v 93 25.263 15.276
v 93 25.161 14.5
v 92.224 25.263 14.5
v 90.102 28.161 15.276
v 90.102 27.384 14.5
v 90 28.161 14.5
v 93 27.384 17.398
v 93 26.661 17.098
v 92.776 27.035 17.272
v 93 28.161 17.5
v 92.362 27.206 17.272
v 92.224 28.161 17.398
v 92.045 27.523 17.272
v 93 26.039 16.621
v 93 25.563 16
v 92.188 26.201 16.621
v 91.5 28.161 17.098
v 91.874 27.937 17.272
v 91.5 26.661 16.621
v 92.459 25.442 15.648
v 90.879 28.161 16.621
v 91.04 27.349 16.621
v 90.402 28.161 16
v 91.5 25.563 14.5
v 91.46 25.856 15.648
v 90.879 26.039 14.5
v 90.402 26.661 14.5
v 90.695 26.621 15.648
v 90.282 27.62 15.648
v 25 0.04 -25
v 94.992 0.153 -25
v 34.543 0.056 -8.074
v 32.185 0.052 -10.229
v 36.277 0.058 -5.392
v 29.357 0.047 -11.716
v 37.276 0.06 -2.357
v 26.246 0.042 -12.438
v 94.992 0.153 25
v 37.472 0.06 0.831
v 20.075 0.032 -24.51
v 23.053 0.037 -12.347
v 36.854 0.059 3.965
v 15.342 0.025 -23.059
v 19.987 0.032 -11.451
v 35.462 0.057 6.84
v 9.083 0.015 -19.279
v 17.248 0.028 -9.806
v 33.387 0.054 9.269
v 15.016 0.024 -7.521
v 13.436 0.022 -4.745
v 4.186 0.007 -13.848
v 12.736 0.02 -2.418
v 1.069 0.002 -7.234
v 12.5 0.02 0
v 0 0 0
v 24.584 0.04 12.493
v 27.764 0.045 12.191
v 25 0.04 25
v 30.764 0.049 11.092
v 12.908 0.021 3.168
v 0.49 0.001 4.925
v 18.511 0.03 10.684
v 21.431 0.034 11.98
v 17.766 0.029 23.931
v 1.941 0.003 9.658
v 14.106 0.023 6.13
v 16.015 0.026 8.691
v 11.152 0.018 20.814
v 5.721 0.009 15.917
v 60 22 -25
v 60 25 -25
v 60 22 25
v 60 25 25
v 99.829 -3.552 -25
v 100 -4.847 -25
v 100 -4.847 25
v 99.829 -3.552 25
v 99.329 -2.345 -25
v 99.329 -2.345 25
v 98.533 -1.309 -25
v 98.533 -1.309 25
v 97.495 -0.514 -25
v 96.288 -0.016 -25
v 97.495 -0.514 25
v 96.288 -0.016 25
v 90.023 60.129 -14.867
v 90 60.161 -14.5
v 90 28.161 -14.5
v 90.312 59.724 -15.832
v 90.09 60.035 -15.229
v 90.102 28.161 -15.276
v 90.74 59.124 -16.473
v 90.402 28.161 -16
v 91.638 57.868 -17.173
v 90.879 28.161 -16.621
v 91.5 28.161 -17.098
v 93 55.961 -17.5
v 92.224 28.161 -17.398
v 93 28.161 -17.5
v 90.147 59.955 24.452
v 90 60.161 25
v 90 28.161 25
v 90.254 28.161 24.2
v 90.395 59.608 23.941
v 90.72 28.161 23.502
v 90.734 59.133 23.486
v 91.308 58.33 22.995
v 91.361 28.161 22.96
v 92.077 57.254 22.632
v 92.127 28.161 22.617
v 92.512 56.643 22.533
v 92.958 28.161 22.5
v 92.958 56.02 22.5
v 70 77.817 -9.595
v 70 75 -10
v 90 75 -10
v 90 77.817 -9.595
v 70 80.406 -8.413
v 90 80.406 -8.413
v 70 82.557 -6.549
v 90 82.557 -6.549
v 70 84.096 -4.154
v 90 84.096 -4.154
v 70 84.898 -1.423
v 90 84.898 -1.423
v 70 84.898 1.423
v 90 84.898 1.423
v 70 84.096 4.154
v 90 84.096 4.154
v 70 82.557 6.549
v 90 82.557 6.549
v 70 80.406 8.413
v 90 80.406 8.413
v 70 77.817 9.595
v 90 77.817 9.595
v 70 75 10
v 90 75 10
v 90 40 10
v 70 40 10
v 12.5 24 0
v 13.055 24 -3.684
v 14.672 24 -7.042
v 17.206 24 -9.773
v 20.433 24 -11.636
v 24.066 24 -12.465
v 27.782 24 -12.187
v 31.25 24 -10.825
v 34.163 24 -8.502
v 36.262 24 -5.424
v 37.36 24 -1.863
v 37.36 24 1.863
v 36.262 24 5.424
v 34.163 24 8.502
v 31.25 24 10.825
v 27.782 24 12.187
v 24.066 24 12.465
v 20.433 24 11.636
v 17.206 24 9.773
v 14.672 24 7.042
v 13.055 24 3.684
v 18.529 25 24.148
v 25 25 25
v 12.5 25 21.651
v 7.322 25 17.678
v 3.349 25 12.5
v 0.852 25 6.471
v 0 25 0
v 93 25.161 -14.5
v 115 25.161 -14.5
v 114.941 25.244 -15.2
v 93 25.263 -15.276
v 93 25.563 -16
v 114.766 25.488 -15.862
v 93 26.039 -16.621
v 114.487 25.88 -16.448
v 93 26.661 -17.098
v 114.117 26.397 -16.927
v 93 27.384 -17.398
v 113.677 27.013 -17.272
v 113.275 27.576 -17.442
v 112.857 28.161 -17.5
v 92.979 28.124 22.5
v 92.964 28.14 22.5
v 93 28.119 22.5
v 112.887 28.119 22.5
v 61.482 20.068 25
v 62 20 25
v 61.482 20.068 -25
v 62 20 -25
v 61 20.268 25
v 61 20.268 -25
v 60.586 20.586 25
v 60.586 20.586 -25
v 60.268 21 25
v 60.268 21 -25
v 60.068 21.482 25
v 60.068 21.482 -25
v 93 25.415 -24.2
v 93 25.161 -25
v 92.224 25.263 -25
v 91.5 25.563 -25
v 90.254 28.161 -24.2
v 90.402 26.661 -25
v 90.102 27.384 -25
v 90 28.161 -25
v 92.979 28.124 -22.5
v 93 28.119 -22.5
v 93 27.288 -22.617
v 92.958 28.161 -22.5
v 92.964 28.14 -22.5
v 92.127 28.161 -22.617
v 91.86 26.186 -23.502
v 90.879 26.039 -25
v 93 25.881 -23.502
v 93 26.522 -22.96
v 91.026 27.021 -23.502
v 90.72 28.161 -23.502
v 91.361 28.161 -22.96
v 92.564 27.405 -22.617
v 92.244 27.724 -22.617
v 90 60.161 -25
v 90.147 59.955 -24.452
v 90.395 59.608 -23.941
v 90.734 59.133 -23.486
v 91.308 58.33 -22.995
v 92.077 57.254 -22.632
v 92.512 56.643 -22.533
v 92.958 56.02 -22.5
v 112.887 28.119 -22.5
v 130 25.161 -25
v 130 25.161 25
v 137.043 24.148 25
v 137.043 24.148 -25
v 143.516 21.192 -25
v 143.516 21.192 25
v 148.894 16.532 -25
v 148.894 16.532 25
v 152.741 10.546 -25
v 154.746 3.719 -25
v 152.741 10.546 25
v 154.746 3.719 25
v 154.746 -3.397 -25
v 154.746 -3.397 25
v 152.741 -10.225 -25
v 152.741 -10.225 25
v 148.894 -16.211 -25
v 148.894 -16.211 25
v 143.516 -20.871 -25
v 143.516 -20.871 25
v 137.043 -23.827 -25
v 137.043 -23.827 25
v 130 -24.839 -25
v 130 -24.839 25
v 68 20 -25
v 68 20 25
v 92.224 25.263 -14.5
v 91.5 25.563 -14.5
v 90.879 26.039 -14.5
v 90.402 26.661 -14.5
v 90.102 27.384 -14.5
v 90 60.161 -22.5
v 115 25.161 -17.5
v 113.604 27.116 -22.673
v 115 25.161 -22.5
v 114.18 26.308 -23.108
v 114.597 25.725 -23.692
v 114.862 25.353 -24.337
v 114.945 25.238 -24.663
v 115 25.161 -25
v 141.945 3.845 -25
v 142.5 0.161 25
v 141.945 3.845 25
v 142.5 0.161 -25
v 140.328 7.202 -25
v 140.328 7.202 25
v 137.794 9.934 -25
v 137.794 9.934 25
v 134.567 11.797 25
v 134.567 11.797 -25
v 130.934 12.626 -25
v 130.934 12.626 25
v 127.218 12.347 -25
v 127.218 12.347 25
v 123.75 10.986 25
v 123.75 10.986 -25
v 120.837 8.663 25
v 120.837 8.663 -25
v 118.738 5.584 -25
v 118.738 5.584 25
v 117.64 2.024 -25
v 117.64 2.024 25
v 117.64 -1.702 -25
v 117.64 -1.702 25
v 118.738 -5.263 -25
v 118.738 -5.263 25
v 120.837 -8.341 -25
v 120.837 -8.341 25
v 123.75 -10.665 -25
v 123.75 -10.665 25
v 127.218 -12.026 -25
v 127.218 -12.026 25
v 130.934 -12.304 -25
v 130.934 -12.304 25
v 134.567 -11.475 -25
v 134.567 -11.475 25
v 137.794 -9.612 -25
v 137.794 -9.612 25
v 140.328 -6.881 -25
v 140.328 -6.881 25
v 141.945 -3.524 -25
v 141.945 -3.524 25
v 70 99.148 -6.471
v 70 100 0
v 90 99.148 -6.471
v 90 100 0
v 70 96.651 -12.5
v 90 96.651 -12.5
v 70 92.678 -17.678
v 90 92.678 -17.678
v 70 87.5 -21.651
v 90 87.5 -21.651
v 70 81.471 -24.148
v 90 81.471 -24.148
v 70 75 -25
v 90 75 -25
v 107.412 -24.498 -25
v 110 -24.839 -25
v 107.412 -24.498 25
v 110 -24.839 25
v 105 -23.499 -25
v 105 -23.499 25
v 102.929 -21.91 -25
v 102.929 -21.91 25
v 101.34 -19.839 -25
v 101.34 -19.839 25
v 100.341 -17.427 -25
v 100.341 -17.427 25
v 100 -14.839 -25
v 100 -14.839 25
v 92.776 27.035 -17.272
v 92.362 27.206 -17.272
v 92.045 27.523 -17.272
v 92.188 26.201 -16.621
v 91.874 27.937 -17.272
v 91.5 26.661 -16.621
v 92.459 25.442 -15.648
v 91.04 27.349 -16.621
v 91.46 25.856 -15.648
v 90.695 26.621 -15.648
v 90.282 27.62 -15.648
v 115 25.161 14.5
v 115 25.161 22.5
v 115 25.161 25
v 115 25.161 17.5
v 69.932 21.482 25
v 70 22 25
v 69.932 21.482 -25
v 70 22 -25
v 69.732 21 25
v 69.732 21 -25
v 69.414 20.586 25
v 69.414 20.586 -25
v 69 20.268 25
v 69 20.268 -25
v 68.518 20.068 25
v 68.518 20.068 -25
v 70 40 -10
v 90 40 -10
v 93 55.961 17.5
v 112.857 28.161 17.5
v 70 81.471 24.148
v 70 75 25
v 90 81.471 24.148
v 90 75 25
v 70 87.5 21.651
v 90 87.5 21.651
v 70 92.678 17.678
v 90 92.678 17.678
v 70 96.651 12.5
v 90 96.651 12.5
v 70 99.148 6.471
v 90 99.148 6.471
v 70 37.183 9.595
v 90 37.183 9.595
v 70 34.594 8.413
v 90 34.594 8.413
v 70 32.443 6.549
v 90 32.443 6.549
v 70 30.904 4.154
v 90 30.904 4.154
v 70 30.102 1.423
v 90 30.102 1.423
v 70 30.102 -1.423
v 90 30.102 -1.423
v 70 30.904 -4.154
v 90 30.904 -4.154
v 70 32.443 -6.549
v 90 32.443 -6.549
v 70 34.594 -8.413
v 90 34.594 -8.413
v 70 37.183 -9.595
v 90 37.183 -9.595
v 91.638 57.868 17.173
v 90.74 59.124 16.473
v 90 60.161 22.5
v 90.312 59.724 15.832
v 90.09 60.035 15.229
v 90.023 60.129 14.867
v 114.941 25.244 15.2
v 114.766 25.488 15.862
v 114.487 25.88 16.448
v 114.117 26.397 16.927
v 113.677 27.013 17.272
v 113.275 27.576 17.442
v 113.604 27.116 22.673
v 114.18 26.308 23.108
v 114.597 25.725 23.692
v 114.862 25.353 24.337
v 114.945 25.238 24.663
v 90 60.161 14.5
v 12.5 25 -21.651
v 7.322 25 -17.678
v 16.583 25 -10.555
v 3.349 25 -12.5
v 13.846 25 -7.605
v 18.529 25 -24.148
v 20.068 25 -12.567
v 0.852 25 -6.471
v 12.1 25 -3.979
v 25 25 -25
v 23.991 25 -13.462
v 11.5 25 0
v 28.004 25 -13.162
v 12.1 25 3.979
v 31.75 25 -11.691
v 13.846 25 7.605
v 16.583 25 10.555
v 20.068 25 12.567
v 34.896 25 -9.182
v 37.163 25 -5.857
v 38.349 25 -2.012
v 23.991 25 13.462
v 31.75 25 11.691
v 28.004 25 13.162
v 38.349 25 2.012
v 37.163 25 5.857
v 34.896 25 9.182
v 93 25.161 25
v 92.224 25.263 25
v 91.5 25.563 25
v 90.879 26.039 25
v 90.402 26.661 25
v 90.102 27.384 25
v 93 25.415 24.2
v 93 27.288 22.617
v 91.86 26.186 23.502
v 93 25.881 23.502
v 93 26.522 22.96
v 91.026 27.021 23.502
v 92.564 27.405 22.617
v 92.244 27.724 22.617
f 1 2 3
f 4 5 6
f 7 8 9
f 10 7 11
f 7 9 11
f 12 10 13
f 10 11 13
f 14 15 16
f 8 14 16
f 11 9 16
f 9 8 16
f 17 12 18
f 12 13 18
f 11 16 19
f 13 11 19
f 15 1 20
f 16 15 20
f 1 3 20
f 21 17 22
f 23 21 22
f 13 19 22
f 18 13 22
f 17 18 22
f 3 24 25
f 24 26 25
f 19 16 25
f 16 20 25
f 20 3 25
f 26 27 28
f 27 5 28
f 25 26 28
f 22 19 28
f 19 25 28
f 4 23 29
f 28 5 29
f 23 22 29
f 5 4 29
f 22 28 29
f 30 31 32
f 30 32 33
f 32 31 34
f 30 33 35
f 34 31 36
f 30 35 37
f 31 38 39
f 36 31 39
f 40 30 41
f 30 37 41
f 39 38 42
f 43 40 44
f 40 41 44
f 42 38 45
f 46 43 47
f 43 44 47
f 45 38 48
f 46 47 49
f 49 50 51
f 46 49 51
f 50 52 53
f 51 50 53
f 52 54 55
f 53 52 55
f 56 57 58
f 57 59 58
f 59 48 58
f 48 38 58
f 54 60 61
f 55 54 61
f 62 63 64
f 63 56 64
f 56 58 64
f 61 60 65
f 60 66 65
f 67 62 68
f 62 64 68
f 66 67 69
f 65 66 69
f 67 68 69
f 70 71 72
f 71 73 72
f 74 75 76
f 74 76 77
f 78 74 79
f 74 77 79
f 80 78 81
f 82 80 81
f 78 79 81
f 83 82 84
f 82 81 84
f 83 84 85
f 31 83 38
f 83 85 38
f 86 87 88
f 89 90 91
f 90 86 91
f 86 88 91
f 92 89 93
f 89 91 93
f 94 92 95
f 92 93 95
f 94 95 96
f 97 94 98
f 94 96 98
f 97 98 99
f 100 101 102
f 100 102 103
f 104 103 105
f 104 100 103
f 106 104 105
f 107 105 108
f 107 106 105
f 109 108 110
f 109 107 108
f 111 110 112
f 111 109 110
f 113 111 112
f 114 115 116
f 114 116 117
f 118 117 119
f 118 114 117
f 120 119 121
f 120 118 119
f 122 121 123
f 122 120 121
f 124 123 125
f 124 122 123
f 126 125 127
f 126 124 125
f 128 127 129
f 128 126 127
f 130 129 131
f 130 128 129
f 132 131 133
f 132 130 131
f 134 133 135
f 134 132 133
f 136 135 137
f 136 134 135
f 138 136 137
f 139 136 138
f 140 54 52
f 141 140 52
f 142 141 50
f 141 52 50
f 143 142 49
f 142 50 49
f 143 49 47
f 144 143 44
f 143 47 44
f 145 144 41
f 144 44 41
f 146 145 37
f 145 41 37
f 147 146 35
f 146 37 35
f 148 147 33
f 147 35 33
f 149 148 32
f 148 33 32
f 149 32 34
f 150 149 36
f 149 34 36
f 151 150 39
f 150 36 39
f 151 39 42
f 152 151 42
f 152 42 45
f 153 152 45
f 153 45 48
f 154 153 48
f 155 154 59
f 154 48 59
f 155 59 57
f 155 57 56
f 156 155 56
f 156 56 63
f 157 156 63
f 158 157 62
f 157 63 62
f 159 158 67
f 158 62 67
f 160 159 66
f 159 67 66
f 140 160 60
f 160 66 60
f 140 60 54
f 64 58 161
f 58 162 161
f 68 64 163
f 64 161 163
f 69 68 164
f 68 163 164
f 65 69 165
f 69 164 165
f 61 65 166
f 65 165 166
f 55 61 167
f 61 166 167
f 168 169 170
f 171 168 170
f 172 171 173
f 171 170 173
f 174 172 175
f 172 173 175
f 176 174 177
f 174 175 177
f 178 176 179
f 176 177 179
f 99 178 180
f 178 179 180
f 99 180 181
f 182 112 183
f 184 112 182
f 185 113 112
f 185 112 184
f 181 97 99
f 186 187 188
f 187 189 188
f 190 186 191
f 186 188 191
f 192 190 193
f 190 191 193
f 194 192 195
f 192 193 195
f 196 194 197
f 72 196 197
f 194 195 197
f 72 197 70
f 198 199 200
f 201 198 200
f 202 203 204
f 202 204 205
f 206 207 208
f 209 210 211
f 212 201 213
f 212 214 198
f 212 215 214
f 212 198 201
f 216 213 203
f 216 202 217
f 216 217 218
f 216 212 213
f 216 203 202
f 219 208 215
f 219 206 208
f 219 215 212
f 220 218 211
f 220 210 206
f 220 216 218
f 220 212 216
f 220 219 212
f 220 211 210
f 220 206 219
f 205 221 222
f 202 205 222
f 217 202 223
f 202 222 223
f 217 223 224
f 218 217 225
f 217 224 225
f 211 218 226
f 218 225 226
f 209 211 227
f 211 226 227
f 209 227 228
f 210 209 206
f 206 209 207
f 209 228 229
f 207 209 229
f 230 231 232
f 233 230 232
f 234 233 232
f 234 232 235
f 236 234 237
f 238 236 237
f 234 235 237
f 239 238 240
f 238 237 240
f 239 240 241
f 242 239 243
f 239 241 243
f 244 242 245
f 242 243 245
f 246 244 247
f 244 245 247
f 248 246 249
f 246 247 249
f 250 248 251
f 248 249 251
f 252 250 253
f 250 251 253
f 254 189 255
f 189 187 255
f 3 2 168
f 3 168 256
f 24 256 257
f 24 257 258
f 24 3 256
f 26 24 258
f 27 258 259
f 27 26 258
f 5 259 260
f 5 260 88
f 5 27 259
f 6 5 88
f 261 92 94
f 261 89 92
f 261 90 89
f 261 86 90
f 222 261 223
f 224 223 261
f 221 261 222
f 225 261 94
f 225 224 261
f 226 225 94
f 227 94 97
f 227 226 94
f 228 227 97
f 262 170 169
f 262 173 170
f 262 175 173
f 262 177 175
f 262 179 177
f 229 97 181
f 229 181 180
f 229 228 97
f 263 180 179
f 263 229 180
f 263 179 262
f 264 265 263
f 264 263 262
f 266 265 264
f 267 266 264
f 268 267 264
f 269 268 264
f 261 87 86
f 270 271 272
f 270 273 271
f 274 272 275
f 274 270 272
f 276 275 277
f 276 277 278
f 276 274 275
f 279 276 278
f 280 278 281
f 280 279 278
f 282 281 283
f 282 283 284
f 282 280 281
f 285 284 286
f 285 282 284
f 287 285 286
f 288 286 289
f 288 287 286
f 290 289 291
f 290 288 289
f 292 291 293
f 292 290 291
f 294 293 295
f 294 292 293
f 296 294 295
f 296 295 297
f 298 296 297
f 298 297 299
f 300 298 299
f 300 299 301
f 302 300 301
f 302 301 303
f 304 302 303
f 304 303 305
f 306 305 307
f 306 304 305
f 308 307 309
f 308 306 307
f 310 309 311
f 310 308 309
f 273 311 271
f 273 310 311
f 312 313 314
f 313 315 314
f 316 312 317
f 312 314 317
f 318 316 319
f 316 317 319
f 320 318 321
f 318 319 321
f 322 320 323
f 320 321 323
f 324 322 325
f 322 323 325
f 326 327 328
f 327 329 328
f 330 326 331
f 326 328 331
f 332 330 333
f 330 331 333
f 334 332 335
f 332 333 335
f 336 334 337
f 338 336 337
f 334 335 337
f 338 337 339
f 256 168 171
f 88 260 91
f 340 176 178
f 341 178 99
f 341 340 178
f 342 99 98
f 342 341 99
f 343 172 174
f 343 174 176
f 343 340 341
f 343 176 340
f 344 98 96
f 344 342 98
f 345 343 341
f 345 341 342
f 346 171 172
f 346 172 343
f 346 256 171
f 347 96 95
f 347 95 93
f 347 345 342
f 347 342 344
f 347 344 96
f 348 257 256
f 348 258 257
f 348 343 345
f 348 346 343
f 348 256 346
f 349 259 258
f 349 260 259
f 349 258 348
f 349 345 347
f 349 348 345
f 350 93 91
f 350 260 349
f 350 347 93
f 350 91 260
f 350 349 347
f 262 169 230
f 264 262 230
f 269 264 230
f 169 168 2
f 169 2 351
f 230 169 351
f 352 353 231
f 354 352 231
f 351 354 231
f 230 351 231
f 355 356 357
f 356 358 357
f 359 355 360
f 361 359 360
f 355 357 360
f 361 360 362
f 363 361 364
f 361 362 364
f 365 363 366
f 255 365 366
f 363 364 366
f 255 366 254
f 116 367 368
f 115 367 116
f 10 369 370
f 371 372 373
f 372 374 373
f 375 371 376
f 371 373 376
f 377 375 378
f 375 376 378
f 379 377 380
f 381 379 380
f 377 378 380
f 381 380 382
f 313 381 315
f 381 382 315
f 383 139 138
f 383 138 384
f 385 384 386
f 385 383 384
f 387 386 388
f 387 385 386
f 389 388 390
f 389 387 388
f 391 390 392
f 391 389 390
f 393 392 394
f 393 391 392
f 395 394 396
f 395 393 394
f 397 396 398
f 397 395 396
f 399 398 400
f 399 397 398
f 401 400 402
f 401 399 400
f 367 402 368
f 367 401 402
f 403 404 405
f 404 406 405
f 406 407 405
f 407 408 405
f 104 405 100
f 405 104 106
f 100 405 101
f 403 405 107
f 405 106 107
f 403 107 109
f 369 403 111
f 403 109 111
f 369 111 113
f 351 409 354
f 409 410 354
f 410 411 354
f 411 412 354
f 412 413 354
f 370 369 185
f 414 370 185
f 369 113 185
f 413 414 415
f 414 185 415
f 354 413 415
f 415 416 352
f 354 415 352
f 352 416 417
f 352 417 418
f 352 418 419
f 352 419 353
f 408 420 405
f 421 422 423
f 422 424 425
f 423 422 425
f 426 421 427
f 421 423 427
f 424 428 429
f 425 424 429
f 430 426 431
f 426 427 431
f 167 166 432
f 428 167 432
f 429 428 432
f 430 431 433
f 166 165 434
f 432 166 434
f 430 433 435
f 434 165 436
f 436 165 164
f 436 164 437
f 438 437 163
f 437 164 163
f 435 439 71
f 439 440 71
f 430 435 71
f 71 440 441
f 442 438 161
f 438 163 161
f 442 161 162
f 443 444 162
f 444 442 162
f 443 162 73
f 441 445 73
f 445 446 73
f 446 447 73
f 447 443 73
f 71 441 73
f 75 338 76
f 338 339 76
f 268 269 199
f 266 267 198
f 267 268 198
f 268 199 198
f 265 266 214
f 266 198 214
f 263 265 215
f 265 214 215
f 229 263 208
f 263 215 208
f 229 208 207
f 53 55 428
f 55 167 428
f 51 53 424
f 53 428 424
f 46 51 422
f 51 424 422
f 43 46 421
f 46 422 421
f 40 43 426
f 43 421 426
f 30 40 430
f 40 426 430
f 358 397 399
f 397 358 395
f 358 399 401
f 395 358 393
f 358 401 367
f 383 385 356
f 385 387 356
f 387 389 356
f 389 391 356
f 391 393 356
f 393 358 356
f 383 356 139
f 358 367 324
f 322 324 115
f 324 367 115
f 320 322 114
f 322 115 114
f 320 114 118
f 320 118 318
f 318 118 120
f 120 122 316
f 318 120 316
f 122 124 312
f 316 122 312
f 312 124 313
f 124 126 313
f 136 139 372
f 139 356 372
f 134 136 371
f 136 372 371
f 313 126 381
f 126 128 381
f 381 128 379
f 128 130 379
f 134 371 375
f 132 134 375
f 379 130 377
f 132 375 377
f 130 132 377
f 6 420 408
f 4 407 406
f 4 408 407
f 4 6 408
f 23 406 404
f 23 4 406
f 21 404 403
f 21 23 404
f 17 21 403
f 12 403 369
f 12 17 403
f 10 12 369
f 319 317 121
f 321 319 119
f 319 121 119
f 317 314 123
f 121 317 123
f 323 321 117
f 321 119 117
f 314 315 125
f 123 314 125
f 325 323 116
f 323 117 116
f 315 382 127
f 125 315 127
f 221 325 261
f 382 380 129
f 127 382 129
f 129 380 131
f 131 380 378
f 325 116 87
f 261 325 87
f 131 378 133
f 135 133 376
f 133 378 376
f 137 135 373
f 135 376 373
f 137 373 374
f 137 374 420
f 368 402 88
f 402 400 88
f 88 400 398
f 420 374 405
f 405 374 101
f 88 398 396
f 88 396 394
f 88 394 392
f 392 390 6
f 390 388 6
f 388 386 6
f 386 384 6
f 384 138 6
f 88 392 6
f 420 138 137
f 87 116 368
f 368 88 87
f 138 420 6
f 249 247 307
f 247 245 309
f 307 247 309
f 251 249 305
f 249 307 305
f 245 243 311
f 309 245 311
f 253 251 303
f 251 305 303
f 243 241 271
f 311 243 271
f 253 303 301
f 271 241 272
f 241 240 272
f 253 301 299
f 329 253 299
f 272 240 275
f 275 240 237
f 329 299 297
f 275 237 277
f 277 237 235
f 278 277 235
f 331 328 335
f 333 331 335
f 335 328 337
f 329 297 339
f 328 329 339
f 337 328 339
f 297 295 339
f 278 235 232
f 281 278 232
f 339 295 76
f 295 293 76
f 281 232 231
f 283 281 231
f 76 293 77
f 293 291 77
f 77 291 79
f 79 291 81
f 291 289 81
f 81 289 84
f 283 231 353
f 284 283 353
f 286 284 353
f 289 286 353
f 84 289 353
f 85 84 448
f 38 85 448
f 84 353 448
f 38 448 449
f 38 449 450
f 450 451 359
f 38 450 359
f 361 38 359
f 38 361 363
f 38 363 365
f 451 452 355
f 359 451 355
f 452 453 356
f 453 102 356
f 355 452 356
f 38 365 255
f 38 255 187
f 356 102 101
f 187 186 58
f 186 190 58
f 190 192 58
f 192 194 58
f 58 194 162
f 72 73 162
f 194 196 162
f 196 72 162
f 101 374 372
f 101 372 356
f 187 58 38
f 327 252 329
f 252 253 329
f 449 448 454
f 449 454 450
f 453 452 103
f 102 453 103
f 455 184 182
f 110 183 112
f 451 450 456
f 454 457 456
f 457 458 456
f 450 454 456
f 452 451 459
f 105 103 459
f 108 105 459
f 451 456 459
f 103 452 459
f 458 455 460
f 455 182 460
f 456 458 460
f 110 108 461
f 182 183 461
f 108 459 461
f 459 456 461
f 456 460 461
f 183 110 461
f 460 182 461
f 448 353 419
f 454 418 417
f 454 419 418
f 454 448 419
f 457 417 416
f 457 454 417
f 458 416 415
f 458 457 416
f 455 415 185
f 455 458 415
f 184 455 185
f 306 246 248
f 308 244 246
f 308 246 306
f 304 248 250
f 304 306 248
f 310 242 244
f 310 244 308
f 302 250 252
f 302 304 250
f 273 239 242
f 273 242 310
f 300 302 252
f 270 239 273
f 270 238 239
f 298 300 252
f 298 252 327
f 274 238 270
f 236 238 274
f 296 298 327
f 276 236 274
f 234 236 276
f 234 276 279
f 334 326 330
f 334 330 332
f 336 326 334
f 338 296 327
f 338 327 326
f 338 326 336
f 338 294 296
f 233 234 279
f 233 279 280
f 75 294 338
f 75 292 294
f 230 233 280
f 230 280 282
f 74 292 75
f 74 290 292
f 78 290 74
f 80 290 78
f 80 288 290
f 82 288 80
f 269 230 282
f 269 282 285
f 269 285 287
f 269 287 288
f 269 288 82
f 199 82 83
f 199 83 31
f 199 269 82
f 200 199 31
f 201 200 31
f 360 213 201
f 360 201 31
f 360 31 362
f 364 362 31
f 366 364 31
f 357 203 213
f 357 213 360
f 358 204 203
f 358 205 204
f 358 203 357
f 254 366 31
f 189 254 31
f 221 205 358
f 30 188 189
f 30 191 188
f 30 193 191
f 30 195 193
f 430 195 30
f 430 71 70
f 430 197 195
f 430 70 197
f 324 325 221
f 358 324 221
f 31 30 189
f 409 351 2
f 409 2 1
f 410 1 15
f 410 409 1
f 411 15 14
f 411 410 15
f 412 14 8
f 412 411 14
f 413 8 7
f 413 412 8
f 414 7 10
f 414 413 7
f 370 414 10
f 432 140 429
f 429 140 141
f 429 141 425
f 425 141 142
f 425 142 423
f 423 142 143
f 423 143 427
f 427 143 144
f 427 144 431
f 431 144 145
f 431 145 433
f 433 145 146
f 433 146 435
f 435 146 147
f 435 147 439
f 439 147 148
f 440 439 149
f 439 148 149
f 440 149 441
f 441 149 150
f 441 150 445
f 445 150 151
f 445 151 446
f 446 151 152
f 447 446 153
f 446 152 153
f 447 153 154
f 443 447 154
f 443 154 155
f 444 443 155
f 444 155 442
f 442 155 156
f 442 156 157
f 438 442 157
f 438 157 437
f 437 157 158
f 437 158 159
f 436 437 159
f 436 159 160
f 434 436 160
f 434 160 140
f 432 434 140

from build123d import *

# Parameters (mm, degrees)
ESBO_O1_R                              = 12.5
RESSALTO_EXTRUS_O1_DEPTH               = 25
FILETE1_R                              = 10
FILETE2_R                              = 5
FILETE3_R                              = 3
FILETE4_R                              = 2
FILETE5_R                              = 25
FURO_DE_DI_METRO_25_0_25_1_D           = 25
FURO_DE_DI_METRO_25_0_25_1_CSINK_D     = 27
FURO_DE_DI_METRO_25_0_25_1_CSINK_ANGLE = 90
CORTE_EXTRUS_O1_DEPTH                  = 50
NERVURA1_REACH                         = 191.868
ESBO_O6_WALL_W                         = 424.748377256
ESBO_O6_WALL_H                         = 5
FILETE6_R                              = 3


with BuildPart() as part:
    # Esboço1 → Ressalto-extrusão1 (new, symmetric)
    with BuildSketch(Plane.XY):
        with BuildLine():
            Line((0, 0), (0, 25))
            Line((0, 25), (60, 25))
            Line((60, 25), (60, 20))
            Line((60, 20), (70, 20))
            Line((70, 20), (70, 100))
            Line((70, 100), (90, 100))
            Line((90, 100), (90, 25.160806235))
            Line((90, 25.160806235), (130, 25.160806235))
            ThreePointArc((130, 25.160806235), (155, 0.160806235), (130, -24.839193765))
            Line((130, -24.839193765), (100, -24.839193765))
            Line((100, -24.839193765), (100, 0.160806235))
            Line((100, 0.160806235), (0, 0))
        make_face()
        with Locations((130, 0.160806235)):
            Circle(ESBO_O1_R, mode=Mode.SUBTRACT)
    extrude(amount=RESSALTO_EXTRUS_O1_DEPTH, both=True)

    # Filete1
    filete1_edges = [part.edges().sort_by_distance(p)[0] for p in [
        (100, -24.839193765, 0),
    ]]
    fillet(filete1_edges, radius=FILETE1_R)

    # Filete2
    filete2_edges = [part.edges().sort_by_distance(p)[0] for p in [
        (100, 0.160806235, 0),
    ]]
    fillet(filete2_edges, radius=FILETE2_R)

    # Filete3
    filete3_edges = [part.edges().sort_by_distance(p)[0] for p in [
        (90, 25.160806235, 0),
    ]]
    fillet(filete3_edges, radius=FILETE3_R)

    # Filete4
    filete4_edges = [part.edges().sort_by_distance(p)[0] for p in [
        (60, 20, 0),
        (70, 20, 0),
    ]]
    fillet(filete4_edges, radius=FILETE4_R)

    # Filete5
    filete5_edges = [part.edges().sort_by_distance(p)[0] for p in [
        (0, 12.5, -25),
        (0, 12.5, 25),
        (80, 100, 25),
        (80, 100, -25),
    ]]
    fillet(filete5_edges, radius=FILETE5_R - 0.0001)  # a hair under: the kernel refuses the full size

    # Furo de diâmetro Ø25.0 (25)1 (through all)
    with Locations(Plane(origin=(0, 25, 0), x_dir=(1, 0, 0), z_dir=(0, 1, 0))):
        with Locations((25, 0)):
            CounterSinkHole(FURO_DE_DI_METRO_25_0_25_1_D / 2, FURO_DE_DI_METRO_25_0_25_1_CSINK_D / 2, counter_sink_angle=FURO_DE_DI_METRO_25_0_25_1_CSINK_ANGLE)

    # Esboço5 → Corte-extrusão1 (cut)
    with BuildSketch(Plane.ZY.offset(-70)):
        with BuildLine():
            Line((10, 75), (10, 40))
            ThreePointArc((10, 40), (0, 30), (-10, 40))
            Line((-10, 40), (-10, 75))
            ThreePointArc((-10, 75), (0, 85), (10, 75))
        make_face()
    extrude(amount=-CORTE_EXTRUS_O1_DEPTH, mode=Mode.SUBTRACT)

    # Esboço6 wall → Nervura1 (add, up to next)
    with BuildSketch(Plane(origin=(102.5, 42.660806235, 20), x_dir=(0.581238193719, -0.813733471207, 0), z_dir=(0.813733471207, 0.581238193719, 0)), mode=Mode.PRIVATE) as nervura1_sk1:
        Rectangle(ESBO_O6_WALL_W, ESBO_O6_WALL_H)
    nervura1_tool1 = extrude(nervura1_sk1.sketch, amount=-NERVURA1_REACH, mode=Mode.PRIVATE) - part.part
    add(nervura1_tool1.solids().sort_by_distance((102.5, 42.660806235, 20))[0])

    # Filete6
    # the kernel refuses this fillet: 3 mm, written as the material it adds along each edge
    with BuildSketch(Plane(origin=(122.5, 25.160806235, 17.5), x_dir=(0, 0, -1), z_dir=(-1, 0, 0))) as filete6_piece_1_section:
        with BuildLine():
            CenterArc((FILETE6_R, -FILETE6_R), FILETE6_R, 90, 90)
            Line((0, -FILETE6_R), (0, 0))
            Line((0, 0), (FILETE6_R, 0))
        make_face()
    filete6_piece_1 = extrude(amount=29.5, mode=Mode.PRIVATE)
    filete6_piece_1 = split(filete6_piece_1, bisect_by=Plane(origin=(117.533783784, 21.613508937, 17.5), z_dir=(-0.8137334712068701, -0.5812381937189072, 0)), keep=Keep.TOP, mode=Mode.PRIVATE)
    add(filete6_piece_1)
    with BuildSketch(Plane(origin=(93, 28.160806235, 17.5), x_dir=(0, -1, 0), z_dir=(1, 0, 0))) as filete6_piece_2:
        with BuildLine():
            CenterArc((3 - FILETE6_R, FILETE6_R), FILETE6_R, 270, 90)
            Line((3, FILETE6_R), (3, 0))
            Line((3, 0), (3 - FILETE6_R, 0))
        make_face()
    revolve(axis=Axis((93, 28.160806235, 17.5), (0, 0, -1)), revolution_arc=90)
    with BuildSketch(Plane(origin=(90, 28.160806235, 17.5), x_dir=(0, 0, -1), z_dir=(0, 1, 0))) as filete6_piece_3_section:
        with BuildLine():
            CenterArc((FILETE6_R, -FILETE6_R), FILETE6_R, 90, 90)
            Line((0, -FILETE6_R), (0, 0))
            Line((0, 0), (FILETE6_R, 0))
        make_face()
    filete6_piece_3 = extrude(amount=39.5, mode=Mode.PRIVATE)
    filete6_piece_3 = split(filete6_piece_3, bisect_by=Plane(origin=(105.135135135, 38.971617046, 17.5), z_dir=(-0.8137334712068701, -0.5812381937189072, 0)), keep=Keep.TOP, mode=Mode.PRIVATE)
    add(filete6_piece_3)
    with BuildSketch(Plane(origin=(93, 25.160806235, 22.5), x_dir=(0, 0, 1), z_dir=(1, 0, 0))) as filete6_piece_4_section:
        with BuildLine():
            CenterArc((3, -2.958039892), FILETE6_R, 99.594068227, 80.405931773)
            Line((0, -2.958039892), (0, 0))
            Line((0, 0), (2.5, 0))
        make_face()
    filete6_piece_4 = extrude(amount=29.395099729, mode=Mode.PRIVATE)
    filete6_piece_4 = split(filete6_piece_4, bisect_by=Plane(origin=(107.567567568, 35.56621164, 22.5), z_dir=(-0.8137334712068701, -0.5812381937189072, 0)), keep=Keep.TOP, mode=Mode.PRIVATE)
    add(filete6_piece_4)
    with BuildSketch(Plane(origin=(93, 28.160806235, 22.5), x_dir=(0, -1, 0), z_dir=(1, 0, 0))) as filete6_piece_5:
        with BuildLine():
            CenterArc((0.041960108, -3), FILETE6_R, 9.594068227, 80.405931773)
            Line((0.041960108, 0), (3, 0))
            Line((3, 0), (3, -2.5))
        make_face()
    revolve(axis=Axis((93, 28.160806235, 22.5), (0, 0, -1)), revolution_arc=90)
    with BuildSketch(Plane(origin=(90, 67.555905964, 22.5), x_dir=(0, 0, 1), z_dir=(0, -1, 0))) as filete6_piece_6_section:
        with BuildLine():
            CenterArc((3, -2.958039892), FILETE6_R, 99.594068227, 80.405931773)
            Line((0, -2.958039892), (0, 0))
            Line((0, 0), (2.5, 0))
        make_face()
    filete6_piece_6 = extrude(amount=39.395099729, mode=Mode.PRIVATE)
    filete6_piece_6 = split(filete6_piece_6, bisect_by=Plane(origin=(86.502317696, 65.057561461, 22.5), z_dir=(-0.8137334712068701, -0.5812381937189072, 0)), keep=Keep.TOP, mode=Mode.PRIVATE)
    add(filete6_piece_6)

    # Espelhar1: read off the stored shape, not the designer's step
    # Espelhar1: part across plane


with BuildPart() as part_1:
    add(part.part)
    add(part.part.mirror(Plane.XY))


solid = part_1.part
